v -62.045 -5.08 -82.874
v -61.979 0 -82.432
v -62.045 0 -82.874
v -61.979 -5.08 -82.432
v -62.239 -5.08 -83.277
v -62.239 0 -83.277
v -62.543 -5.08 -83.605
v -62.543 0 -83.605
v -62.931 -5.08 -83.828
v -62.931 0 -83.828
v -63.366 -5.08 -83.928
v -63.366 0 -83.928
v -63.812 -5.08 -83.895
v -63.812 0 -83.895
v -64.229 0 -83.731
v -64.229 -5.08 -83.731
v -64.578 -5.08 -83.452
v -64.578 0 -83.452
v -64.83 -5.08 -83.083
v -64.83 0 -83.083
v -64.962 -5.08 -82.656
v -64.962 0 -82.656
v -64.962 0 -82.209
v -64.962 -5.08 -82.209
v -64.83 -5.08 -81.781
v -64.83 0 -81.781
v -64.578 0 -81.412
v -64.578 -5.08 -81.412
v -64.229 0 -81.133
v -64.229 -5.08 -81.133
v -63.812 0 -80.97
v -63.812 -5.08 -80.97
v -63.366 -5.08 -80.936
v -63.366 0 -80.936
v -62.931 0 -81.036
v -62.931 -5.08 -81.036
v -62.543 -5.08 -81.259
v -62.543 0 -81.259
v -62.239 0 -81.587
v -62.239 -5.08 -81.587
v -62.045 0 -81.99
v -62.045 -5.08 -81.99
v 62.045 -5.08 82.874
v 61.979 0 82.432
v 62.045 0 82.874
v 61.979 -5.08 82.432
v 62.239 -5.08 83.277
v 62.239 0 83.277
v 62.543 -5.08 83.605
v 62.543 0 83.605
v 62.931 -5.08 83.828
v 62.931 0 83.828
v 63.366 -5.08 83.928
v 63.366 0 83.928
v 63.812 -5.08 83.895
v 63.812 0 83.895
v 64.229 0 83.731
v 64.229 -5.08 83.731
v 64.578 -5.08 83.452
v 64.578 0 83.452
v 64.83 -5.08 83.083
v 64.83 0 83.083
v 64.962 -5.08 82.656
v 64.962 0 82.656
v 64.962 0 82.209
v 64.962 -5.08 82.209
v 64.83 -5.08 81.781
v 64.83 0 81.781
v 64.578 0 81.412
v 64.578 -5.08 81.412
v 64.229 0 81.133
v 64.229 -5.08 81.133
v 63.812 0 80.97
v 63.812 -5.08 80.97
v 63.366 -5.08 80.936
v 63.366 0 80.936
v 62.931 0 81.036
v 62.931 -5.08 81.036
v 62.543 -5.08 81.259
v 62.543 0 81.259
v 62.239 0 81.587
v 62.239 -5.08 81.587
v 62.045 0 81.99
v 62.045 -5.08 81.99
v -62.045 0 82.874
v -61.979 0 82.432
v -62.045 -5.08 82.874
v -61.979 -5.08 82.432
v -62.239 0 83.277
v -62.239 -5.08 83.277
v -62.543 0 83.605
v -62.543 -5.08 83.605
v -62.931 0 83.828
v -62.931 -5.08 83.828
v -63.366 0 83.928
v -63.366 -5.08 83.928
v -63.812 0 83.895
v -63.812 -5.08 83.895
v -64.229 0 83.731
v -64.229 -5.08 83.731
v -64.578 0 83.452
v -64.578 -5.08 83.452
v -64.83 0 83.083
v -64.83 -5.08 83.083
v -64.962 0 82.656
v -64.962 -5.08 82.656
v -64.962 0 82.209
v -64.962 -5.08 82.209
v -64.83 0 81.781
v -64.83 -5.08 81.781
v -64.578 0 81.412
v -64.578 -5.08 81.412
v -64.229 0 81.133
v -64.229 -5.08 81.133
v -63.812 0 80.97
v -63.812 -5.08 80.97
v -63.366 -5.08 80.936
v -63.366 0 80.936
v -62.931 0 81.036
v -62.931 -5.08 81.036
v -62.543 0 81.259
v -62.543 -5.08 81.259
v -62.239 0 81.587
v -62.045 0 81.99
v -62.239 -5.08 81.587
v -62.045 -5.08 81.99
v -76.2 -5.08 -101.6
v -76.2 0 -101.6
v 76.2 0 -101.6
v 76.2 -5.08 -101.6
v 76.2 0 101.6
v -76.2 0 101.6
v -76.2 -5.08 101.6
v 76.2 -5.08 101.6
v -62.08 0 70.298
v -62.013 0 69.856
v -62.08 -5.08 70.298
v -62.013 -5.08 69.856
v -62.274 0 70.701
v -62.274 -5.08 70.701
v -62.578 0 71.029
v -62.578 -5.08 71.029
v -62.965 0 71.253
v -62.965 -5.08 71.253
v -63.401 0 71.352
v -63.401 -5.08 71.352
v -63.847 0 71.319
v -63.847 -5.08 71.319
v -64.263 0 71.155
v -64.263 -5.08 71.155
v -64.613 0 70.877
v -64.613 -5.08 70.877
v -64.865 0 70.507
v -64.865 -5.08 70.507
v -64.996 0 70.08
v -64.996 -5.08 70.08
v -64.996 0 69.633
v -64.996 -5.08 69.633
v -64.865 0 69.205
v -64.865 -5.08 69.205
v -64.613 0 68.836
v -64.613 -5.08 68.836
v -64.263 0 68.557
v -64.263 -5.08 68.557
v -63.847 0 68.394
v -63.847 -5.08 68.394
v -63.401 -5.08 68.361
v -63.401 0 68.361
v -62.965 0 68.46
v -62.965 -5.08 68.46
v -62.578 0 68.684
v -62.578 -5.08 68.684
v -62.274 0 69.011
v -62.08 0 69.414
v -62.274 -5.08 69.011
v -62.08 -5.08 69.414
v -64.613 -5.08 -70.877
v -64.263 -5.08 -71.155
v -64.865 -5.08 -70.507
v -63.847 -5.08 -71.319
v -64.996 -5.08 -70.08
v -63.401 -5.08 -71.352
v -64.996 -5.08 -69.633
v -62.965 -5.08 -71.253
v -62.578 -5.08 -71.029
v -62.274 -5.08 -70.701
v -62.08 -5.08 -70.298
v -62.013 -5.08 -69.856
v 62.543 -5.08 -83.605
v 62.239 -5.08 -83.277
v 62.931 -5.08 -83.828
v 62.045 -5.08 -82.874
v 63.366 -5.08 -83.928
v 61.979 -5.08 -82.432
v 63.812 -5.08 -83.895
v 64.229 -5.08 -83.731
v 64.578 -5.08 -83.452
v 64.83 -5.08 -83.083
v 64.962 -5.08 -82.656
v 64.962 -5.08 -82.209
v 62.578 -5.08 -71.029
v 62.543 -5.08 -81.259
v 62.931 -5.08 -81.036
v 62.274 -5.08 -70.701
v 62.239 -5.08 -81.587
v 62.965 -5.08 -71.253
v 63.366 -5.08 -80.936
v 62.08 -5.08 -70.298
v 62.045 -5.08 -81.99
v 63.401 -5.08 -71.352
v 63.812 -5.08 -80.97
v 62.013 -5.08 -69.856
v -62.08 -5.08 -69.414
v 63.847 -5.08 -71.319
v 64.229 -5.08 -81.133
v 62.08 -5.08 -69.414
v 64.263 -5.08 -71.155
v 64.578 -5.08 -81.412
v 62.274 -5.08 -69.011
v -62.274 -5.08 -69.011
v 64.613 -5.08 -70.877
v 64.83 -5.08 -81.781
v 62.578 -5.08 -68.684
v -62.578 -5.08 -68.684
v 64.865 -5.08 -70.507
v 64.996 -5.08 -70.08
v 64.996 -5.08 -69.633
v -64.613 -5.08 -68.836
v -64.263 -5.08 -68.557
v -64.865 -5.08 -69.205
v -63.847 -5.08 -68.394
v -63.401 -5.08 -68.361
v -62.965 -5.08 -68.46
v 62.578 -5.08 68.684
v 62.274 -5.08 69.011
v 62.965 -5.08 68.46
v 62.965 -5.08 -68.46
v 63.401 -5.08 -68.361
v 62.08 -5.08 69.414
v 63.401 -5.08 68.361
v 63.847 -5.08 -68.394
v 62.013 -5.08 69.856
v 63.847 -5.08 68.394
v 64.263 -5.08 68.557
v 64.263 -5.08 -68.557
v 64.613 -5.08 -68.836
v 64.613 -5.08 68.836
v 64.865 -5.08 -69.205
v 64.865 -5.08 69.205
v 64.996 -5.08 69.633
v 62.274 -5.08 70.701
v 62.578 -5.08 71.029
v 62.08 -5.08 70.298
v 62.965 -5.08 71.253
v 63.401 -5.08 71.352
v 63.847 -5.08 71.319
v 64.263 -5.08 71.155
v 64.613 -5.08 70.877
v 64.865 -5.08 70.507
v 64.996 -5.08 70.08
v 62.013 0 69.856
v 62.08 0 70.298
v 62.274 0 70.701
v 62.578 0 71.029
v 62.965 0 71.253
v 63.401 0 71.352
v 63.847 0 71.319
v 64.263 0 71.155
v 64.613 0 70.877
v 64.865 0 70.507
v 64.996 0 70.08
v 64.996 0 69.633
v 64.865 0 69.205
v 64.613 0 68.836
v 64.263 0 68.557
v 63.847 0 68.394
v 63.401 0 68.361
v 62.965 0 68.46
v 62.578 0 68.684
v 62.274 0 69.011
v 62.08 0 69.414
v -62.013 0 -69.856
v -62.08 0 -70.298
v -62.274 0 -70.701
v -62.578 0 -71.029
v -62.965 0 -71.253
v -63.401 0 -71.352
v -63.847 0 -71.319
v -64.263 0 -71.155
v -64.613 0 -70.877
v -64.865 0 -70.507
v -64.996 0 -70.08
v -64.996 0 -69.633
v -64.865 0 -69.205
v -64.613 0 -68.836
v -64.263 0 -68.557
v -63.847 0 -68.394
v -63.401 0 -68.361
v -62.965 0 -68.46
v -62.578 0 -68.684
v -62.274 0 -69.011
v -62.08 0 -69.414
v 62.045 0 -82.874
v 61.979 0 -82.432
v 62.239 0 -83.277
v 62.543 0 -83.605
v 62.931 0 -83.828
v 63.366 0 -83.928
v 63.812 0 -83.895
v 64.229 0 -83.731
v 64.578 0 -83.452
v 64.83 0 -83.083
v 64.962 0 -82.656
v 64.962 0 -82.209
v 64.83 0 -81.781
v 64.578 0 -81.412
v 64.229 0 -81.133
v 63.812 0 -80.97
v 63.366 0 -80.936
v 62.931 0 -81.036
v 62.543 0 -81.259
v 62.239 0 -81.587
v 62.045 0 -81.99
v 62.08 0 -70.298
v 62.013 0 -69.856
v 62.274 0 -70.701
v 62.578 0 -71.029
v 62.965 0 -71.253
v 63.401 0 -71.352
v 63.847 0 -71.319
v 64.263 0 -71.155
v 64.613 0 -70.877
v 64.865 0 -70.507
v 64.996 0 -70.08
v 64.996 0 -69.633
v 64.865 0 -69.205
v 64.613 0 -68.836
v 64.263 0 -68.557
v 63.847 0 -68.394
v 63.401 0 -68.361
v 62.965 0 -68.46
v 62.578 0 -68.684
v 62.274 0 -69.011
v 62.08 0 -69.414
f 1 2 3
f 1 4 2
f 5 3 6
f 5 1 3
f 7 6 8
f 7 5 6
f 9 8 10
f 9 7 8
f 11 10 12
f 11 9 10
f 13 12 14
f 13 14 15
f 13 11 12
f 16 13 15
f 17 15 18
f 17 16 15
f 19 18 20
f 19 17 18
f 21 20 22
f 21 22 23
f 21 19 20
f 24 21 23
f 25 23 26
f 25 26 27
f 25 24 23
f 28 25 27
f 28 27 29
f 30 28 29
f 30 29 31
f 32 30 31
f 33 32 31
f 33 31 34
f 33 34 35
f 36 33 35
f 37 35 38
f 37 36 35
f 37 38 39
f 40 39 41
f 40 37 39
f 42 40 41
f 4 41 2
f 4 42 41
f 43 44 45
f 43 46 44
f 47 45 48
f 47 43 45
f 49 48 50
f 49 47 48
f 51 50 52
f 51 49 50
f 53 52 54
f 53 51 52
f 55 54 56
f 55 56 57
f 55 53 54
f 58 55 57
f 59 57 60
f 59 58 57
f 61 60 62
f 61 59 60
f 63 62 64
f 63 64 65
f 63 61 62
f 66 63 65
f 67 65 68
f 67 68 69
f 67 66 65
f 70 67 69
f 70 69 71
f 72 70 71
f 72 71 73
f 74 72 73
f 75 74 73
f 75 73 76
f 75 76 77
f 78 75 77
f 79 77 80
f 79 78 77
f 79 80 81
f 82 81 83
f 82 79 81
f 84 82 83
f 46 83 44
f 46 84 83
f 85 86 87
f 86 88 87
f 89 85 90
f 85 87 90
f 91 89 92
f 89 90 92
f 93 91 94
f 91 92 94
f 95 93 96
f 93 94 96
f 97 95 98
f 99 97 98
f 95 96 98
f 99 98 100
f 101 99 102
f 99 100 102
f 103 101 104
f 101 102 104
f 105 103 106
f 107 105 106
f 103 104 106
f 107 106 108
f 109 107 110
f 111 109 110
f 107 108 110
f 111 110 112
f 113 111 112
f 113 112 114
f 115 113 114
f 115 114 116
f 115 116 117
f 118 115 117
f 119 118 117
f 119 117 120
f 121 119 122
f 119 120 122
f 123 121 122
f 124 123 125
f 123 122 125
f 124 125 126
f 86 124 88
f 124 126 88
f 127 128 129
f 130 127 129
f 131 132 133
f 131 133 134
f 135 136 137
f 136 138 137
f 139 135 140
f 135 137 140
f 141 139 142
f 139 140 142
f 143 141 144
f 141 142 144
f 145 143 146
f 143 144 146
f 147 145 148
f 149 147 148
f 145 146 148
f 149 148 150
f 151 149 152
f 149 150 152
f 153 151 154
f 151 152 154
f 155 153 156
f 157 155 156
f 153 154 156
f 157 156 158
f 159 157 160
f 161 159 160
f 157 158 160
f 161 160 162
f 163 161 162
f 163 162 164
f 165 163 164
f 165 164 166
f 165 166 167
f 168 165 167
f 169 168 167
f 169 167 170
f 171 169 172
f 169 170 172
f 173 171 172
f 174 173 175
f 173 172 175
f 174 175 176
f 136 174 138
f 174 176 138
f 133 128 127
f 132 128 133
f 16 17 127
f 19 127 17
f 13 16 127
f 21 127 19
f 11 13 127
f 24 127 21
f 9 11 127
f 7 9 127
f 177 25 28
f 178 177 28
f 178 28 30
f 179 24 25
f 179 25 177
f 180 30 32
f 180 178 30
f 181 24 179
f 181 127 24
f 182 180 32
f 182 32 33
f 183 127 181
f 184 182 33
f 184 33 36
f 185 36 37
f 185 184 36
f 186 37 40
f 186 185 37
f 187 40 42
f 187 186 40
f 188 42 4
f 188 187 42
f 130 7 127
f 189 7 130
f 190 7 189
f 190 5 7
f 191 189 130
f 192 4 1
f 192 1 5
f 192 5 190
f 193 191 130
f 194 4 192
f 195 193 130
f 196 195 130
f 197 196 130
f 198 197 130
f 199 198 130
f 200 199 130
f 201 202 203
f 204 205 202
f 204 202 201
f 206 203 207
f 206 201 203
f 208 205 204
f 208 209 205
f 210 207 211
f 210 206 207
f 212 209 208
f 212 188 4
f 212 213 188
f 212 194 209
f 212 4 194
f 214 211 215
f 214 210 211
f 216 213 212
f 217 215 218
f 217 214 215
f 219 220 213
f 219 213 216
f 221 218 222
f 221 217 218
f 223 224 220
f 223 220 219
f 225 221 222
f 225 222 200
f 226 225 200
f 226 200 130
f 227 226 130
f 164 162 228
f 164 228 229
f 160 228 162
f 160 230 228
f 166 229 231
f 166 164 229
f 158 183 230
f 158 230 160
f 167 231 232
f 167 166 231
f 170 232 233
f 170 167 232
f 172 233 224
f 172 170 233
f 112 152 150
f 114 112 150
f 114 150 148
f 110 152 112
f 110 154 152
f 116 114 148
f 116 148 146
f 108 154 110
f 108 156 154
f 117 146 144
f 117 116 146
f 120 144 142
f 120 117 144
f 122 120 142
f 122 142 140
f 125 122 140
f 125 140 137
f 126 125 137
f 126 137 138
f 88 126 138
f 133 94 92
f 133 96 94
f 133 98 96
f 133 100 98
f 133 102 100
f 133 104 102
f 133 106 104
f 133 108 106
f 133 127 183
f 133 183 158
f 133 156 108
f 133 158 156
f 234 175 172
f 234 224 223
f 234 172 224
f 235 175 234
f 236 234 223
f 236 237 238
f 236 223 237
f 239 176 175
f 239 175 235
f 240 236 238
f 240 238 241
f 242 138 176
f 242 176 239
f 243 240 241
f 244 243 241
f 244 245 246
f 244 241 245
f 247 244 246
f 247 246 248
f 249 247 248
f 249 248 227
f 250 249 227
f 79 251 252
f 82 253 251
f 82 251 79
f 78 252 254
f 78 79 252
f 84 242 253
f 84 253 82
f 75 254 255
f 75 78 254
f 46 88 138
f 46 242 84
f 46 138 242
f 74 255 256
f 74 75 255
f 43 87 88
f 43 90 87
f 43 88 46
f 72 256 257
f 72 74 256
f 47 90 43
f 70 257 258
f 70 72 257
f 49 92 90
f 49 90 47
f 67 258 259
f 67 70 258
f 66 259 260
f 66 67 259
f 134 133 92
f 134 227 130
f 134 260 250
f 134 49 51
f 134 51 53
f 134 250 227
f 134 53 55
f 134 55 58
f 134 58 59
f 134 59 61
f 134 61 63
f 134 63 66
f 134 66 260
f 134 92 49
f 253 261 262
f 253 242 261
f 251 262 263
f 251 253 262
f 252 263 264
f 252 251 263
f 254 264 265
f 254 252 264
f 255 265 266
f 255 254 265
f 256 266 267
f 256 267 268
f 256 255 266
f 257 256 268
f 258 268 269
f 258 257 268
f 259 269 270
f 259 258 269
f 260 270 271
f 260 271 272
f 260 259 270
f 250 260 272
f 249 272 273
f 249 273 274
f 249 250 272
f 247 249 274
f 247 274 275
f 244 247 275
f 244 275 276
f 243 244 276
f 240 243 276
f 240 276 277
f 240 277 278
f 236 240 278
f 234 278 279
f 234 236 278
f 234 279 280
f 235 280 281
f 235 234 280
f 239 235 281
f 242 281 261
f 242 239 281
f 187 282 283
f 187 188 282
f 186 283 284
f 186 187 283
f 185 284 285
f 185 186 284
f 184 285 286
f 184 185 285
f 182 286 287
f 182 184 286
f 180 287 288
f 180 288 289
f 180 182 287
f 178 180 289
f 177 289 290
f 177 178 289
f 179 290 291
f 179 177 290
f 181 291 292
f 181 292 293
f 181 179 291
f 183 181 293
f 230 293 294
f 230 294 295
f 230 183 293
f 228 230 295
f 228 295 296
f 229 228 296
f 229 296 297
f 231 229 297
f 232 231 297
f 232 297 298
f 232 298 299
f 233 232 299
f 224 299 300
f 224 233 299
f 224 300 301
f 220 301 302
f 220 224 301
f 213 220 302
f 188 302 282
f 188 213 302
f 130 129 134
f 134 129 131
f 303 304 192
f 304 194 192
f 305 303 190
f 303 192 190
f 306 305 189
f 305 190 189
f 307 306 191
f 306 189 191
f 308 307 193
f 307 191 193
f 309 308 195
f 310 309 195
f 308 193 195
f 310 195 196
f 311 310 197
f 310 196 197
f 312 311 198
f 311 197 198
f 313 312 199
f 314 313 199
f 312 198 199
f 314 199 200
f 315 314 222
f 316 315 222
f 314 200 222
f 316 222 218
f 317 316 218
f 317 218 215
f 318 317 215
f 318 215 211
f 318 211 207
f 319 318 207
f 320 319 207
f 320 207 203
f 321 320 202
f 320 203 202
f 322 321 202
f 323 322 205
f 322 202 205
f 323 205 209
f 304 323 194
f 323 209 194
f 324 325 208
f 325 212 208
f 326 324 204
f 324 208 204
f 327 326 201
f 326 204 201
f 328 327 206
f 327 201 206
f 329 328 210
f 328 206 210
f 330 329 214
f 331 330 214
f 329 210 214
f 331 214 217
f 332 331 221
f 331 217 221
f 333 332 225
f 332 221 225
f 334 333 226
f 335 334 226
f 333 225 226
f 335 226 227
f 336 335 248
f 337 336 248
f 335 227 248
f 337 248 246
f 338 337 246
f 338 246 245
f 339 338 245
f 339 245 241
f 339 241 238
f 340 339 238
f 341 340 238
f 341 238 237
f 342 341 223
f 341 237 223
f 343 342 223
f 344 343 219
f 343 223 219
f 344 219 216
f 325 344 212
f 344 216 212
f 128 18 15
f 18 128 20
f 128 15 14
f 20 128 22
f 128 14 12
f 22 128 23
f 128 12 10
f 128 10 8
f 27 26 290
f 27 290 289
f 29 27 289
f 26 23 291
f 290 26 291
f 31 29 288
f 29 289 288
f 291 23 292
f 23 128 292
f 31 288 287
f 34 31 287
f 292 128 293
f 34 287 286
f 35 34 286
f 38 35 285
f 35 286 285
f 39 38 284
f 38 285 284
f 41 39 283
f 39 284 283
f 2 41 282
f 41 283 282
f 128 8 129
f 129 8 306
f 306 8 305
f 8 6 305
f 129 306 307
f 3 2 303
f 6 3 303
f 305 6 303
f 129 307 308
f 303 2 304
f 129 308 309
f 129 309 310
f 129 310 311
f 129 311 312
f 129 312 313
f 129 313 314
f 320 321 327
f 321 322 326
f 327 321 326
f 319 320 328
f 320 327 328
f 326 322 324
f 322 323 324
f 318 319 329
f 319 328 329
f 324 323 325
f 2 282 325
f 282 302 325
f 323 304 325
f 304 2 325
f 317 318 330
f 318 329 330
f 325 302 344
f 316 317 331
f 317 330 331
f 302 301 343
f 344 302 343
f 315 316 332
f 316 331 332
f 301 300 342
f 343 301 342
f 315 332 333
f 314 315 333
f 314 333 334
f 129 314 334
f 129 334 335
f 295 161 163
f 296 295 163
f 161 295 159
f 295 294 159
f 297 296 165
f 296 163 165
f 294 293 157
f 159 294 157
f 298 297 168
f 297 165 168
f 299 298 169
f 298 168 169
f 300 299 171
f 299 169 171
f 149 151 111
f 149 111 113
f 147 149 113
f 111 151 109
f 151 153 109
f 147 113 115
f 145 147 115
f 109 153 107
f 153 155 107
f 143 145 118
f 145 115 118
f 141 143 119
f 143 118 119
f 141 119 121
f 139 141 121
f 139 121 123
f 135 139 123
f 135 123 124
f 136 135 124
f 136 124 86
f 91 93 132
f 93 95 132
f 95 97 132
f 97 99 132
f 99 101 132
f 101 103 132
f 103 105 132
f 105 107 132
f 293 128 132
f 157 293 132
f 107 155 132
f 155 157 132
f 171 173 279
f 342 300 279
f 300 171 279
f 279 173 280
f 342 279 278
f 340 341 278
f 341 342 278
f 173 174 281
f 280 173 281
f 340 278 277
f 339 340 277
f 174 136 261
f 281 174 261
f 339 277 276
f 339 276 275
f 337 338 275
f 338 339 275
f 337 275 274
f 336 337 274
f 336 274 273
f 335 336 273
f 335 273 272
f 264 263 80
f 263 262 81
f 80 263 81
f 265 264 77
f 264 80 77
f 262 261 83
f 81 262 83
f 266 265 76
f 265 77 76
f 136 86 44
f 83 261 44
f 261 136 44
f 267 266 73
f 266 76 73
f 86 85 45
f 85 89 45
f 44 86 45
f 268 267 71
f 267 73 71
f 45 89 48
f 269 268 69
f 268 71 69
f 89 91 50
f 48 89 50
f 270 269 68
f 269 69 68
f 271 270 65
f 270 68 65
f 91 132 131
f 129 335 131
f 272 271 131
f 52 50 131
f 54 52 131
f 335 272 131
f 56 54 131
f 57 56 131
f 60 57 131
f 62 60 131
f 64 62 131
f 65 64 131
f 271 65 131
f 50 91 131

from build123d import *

# Parameters (mm, degrees)
F0_W     = 152.4
F0_H     = 203.2
F1_DEPTH = 5.08
F3_R     = 1.5
F4_DEPTH = 0.3
F5_DEPTH = 25.4


with BuildPart() as f1:
    # F0 (on Front) → F1 (new body)
    with BuildSketch(Plane.XZ):
        Rectangle(F0_W, F0_H)
    extrude(amount=F1_DEPTH)

    # F3 (on face) → F4 (cut)
    with BuildSketch(Plane.XZ.offset(5.08)):
        with Locations((-63.478535, 82.432186)):
            Circle(F3_R)
        with Locations((-63.513085, 69.856319)):
            Circle(F3_R)
    extrude(amount=-F4_DEPTH, mode=Mode.SUBTRACT)

    # F3 (on face) → F5 (cut)
    with BuildSketch(Plane.XZ.offset(5.08)):
        with Locations((-63.478535, 82.432186)):
            Circle(F3_R)
        with Locations((-63.513085, 69.856319)):
            Circle(F3_R)
    extrude(amount=-F5_DEPTH, mode=Mode.SUBTRACT)

    # F6: F1 across plane


with BuildPart() as f1_1:
    add(f1.part)
    add(f1.part.mirror(Plane.YZ), mode=Mode.INTERSECT)

    # F7: F1 across plane


with BuildPart() as f1_2:
    add(f1_1.part)
    add(f1_1.part.mirror(Plane.XY), mode=Mode.INTERSECT)


solid = f1_2.part
